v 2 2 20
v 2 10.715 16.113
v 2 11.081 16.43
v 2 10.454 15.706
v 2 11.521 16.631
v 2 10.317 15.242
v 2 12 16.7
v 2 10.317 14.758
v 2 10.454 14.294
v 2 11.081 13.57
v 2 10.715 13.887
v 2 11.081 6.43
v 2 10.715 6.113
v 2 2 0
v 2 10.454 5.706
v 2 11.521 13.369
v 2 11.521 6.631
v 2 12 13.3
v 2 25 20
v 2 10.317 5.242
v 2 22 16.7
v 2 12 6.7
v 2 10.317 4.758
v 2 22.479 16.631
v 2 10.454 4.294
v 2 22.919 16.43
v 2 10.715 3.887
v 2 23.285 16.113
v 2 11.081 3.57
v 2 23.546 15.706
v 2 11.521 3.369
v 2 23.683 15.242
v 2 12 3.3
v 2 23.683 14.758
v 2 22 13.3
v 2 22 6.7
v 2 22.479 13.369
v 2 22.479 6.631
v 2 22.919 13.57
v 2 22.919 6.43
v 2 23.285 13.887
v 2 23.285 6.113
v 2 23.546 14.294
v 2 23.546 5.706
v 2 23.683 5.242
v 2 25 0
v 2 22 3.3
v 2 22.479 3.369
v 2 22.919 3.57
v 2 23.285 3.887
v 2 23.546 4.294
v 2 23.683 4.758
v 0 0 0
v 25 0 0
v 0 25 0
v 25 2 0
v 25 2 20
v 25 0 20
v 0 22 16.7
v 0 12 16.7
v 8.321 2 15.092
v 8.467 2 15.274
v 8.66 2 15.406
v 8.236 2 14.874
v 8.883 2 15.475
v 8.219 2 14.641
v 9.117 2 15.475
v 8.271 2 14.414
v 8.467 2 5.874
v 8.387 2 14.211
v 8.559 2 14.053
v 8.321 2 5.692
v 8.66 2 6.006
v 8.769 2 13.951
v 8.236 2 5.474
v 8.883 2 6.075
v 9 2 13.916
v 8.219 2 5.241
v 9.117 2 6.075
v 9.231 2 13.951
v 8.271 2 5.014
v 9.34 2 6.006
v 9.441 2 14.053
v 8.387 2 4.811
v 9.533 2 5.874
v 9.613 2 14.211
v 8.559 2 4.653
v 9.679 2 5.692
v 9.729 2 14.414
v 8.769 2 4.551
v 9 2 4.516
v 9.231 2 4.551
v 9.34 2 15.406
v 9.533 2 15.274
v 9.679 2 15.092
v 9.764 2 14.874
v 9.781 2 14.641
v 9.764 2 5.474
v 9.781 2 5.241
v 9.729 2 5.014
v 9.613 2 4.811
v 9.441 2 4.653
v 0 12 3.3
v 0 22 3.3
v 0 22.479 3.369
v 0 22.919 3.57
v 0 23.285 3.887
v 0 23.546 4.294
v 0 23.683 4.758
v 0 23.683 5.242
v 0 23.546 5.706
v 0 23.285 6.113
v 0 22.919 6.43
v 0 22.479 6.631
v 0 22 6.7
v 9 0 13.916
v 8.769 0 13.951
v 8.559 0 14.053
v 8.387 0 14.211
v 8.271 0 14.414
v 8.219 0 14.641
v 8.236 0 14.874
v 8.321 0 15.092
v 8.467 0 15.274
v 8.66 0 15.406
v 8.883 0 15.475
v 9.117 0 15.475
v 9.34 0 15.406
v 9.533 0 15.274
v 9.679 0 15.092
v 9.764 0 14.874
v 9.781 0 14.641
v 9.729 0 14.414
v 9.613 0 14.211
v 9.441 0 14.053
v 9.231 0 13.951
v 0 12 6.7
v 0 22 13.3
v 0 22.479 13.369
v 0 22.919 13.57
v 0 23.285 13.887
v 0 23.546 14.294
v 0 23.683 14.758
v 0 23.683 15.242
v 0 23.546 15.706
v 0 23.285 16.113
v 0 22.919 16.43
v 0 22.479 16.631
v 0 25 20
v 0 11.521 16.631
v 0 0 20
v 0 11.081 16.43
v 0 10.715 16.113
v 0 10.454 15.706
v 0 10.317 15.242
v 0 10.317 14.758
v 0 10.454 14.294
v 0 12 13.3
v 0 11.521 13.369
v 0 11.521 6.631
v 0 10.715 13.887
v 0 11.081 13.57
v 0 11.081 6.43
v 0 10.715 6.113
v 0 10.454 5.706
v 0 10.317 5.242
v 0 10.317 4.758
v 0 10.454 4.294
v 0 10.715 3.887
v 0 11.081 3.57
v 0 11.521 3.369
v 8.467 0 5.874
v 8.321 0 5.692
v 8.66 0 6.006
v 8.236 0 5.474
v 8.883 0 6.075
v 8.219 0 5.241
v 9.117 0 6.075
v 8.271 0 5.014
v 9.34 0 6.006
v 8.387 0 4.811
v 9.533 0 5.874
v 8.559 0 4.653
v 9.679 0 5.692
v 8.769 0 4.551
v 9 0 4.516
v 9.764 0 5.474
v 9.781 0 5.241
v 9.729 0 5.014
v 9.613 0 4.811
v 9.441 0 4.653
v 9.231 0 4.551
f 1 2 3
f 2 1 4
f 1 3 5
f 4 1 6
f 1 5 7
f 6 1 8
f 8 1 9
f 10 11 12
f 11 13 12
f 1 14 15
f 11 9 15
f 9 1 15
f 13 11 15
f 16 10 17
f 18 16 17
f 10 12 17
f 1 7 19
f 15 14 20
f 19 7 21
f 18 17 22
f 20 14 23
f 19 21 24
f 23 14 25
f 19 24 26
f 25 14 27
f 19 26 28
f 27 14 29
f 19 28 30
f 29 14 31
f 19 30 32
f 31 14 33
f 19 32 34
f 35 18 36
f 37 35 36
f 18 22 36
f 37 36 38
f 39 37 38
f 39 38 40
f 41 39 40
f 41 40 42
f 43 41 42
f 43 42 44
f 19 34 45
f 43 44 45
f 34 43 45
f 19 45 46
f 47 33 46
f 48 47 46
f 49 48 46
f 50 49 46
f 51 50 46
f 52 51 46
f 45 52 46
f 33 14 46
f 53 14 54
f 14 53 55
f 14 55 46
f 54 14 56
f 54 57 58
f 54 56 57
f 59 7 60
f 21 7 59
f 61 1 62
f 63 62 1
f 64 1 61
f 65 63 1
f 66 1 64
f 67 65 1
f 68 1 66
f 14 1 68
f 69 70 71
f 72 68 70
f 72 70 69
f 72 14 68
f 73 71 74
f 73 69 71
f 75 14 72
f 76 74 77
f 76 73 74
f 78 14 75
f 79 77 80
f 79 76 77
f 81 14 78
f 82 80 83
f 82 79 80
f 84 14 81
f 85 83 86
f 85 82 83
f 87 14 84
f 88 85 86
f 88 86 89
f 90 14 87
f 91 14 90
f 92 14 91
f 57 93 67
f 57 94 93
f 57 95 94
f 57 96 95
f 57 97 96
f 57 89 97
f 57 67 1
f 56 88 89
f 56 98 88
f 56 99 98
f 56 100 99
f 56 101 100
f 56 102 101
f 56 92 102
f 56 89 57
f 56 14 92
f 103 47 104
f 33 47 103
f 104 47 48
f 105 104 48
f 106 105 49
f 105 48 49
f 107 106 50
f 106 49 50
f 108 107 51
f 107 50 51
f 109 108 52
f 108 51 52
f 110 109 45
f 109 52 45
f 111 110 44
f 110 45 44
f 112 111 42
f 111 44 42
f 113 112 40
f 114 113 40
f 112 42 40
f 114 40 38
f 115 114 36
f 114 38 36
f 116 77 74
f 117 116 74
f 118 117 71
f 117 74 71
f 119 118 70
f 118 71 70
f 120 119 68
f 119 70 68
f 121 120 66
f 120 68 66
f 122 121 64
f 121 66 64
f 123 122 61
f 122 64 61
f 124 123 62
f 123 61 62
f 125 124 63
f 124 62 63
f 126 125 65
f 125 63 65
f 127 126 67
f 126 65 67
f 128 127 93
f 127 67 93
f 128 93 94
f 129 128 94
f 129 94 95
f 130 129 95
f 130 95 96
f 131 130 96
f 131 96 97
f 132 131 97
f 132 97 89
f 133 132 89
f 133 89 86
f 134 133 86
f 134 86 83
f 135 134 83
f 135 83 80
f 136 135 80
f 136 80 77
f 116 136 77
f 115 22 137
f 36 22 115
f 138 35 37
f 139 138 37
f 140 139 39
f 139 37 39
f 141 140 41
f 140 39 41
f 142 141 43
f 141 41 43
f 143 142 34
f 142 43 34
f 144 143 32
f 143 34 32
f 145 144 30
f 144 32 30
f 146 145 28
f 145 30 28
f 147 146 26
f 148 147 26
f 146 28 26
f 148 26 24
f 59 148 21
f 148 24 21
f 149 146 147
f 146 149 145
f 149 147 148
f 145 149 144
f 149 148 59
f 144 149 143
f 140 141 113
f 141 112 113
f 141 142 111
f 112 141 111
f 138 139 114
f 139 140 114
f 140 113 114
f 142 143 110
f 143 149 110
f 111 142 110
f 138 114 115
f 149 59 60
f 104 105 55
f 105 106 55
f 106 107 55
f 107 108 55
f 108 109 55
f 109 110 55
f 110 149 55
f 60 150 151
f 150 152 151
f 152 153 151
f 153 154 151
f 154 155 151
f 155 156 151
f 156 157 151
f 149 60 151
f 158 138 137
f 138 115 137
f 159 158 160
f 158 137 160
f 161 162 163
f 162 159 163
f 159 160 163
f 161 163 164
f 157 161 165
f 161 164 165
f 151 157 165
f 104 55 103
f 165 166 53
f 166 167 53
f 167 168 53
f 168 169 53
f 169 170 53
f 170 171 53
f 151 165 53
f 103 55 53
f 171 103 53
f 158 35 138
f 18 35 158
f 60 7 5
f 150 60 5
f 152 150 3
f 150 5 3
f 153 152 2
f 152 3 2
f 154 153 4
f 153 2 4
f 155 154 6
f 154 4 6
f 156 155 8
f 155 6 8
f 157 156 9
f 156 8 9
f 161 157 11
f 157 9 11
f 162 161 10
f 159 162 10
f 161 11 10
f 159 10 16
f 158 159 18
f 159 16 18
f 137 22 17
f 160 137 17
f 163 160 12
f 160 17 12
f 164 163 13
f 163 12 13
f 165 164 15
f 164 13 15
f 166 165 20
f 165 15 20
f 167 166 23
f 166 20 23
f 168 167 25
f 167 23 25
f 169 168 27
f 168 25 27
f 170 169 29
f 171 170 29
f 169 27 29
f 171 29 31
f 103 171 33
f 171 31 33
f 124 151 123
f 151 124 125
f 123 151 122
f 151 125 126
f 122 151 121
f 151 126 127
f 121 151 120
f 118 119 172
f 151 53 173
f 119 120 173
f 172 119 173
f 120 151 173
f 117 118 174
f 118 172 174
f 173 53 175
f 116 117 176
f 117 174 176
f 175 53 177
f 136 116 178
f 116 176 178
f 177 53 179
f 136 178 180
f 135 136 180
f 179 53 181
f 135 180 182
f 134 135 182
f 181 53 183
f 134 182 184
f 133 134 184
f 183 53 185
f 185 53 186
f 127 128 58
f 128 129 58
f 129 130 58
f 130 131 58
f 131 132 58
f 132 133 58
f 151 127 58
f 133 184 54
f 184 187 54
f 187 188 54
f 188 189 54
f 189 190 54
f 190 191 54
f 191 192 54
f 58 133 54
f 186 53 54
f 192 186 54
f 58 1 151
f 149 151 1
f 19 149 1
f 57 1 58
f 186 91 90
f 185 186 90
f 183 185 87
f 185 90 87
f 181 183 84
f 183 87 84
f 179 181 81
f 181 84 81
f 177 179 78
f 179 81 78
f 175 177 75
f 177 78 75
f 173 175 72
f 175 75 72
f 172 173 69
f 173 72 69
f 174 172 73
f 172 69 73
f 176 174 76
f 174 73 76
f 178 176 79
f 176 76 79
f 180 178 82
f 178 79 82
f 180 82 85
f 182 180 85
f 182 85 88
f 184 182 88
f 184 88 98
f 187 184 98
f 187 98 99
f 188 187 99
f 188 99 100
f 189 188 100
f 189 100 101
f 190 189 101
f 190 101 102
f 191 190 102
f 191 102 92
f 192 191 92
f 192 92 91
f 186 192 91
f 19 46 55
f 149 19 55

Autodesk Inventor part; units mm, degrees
ref_plane "YZ Plane" through (0, 0, 0) normal (1, 0, 0) x (0, 1, 0)
ref_plane "XZ Plane" through (0, 0, 0) normal (0, 1, 0) x (-1, 0, 0)
ref_plane "XY Plane" through (0, 0, 0) normal (0, 0, 1) x (1, 0, 0)
sketch "Skizze1" plane through (0, 0, 0) normal (0, 0, 1) x (1, 0, 0)
  line L0 (0, 0) -> (25, 0)
  line L1 (2, 2) -> (2, 25)
  line L2 (2, 25) -> (0, 25)
  line L3 (0, 25) -> (0, 0)
  line L4 (2, 2) -> (25, 2)
  line L5 (25, 2) -> (25, 0)
  dimension "d0" = 2
  dimension "d1" = 25
  dimension "d2" = 25
extrude "Extrusion1" add sketch "Skizze1" along normal blind 20
sketch "Skizze2" plane through (0, 0, 0) normal (0, -1, 0) x (1, 0, 0)
  line L0 (25, 20) -> (0, 20) projected
  line L1 (0, 0) -> (0, 20) projected
  line L2 (0, 0) -> (25, 0) projected
  line L3 (25, 0) -> (25, 20) projected
  line L4 (9, 20) -> (9, 0)
  line L5 (0, 10) -> (25, 10)
  point P0 (9, 14.7)
  point P1 (9, 5.3)
  dimension "d5" = 9
  dimension "d6" = 9.4
hole "Bohrung1" at (9, 0, 14.7) at (9, 0, 5.3) direction (0, 1, 0) diameter 1.567 end through all thread size "M2x0.4" class "6H" standard "ISO Metric profile"
sketch "Skizze3" plane through (2, 2, 0) normal (1, 0, 0) x (0, 0, -1)
  line L0 (0, 0) -> (-20, 0) projected
  line L1 (0, 23) -> (-20, 23) projected
  line L2 (-13.3, 20) -> (-13.3, 10)
  line L3 (-16.7, 10) -> (-16.7, 20)
  line L4 (-3.3, 20) -> (-3.3, 10)
  line L5 (-6.7, 10) -> (-6.7, 20)
  line L6 (-10, 23) -> (-10, 0)
  line L7 (-15, 20) -> (-15, 10)
  line L8 (-5, 10) -> (-5, 20)
  arc A0 (-13.3, 20) -> (-16.7, 20) centre (-15, 20) ccw
  arc A1 (-3.3, 20) -> (-6.7, 20) centre (-5, 20) ccw
  arc A2 (-6.7, 10) -> (-3.3, 10) centre (-5, 10) ccw
  arc A3 (-16.7, 10) -> (-13.3, 10) centre (-15, 10) ccw
  point P0 (0, -2)
  dimension "d14" = 10
  dimension "d15" = 3.4
  dimension "d16" = 3
  dimension "d18" = 10
extrude "Extrusion2" cut sketch "Skizze3" against normal through all
properties part number "13_0204_070"
